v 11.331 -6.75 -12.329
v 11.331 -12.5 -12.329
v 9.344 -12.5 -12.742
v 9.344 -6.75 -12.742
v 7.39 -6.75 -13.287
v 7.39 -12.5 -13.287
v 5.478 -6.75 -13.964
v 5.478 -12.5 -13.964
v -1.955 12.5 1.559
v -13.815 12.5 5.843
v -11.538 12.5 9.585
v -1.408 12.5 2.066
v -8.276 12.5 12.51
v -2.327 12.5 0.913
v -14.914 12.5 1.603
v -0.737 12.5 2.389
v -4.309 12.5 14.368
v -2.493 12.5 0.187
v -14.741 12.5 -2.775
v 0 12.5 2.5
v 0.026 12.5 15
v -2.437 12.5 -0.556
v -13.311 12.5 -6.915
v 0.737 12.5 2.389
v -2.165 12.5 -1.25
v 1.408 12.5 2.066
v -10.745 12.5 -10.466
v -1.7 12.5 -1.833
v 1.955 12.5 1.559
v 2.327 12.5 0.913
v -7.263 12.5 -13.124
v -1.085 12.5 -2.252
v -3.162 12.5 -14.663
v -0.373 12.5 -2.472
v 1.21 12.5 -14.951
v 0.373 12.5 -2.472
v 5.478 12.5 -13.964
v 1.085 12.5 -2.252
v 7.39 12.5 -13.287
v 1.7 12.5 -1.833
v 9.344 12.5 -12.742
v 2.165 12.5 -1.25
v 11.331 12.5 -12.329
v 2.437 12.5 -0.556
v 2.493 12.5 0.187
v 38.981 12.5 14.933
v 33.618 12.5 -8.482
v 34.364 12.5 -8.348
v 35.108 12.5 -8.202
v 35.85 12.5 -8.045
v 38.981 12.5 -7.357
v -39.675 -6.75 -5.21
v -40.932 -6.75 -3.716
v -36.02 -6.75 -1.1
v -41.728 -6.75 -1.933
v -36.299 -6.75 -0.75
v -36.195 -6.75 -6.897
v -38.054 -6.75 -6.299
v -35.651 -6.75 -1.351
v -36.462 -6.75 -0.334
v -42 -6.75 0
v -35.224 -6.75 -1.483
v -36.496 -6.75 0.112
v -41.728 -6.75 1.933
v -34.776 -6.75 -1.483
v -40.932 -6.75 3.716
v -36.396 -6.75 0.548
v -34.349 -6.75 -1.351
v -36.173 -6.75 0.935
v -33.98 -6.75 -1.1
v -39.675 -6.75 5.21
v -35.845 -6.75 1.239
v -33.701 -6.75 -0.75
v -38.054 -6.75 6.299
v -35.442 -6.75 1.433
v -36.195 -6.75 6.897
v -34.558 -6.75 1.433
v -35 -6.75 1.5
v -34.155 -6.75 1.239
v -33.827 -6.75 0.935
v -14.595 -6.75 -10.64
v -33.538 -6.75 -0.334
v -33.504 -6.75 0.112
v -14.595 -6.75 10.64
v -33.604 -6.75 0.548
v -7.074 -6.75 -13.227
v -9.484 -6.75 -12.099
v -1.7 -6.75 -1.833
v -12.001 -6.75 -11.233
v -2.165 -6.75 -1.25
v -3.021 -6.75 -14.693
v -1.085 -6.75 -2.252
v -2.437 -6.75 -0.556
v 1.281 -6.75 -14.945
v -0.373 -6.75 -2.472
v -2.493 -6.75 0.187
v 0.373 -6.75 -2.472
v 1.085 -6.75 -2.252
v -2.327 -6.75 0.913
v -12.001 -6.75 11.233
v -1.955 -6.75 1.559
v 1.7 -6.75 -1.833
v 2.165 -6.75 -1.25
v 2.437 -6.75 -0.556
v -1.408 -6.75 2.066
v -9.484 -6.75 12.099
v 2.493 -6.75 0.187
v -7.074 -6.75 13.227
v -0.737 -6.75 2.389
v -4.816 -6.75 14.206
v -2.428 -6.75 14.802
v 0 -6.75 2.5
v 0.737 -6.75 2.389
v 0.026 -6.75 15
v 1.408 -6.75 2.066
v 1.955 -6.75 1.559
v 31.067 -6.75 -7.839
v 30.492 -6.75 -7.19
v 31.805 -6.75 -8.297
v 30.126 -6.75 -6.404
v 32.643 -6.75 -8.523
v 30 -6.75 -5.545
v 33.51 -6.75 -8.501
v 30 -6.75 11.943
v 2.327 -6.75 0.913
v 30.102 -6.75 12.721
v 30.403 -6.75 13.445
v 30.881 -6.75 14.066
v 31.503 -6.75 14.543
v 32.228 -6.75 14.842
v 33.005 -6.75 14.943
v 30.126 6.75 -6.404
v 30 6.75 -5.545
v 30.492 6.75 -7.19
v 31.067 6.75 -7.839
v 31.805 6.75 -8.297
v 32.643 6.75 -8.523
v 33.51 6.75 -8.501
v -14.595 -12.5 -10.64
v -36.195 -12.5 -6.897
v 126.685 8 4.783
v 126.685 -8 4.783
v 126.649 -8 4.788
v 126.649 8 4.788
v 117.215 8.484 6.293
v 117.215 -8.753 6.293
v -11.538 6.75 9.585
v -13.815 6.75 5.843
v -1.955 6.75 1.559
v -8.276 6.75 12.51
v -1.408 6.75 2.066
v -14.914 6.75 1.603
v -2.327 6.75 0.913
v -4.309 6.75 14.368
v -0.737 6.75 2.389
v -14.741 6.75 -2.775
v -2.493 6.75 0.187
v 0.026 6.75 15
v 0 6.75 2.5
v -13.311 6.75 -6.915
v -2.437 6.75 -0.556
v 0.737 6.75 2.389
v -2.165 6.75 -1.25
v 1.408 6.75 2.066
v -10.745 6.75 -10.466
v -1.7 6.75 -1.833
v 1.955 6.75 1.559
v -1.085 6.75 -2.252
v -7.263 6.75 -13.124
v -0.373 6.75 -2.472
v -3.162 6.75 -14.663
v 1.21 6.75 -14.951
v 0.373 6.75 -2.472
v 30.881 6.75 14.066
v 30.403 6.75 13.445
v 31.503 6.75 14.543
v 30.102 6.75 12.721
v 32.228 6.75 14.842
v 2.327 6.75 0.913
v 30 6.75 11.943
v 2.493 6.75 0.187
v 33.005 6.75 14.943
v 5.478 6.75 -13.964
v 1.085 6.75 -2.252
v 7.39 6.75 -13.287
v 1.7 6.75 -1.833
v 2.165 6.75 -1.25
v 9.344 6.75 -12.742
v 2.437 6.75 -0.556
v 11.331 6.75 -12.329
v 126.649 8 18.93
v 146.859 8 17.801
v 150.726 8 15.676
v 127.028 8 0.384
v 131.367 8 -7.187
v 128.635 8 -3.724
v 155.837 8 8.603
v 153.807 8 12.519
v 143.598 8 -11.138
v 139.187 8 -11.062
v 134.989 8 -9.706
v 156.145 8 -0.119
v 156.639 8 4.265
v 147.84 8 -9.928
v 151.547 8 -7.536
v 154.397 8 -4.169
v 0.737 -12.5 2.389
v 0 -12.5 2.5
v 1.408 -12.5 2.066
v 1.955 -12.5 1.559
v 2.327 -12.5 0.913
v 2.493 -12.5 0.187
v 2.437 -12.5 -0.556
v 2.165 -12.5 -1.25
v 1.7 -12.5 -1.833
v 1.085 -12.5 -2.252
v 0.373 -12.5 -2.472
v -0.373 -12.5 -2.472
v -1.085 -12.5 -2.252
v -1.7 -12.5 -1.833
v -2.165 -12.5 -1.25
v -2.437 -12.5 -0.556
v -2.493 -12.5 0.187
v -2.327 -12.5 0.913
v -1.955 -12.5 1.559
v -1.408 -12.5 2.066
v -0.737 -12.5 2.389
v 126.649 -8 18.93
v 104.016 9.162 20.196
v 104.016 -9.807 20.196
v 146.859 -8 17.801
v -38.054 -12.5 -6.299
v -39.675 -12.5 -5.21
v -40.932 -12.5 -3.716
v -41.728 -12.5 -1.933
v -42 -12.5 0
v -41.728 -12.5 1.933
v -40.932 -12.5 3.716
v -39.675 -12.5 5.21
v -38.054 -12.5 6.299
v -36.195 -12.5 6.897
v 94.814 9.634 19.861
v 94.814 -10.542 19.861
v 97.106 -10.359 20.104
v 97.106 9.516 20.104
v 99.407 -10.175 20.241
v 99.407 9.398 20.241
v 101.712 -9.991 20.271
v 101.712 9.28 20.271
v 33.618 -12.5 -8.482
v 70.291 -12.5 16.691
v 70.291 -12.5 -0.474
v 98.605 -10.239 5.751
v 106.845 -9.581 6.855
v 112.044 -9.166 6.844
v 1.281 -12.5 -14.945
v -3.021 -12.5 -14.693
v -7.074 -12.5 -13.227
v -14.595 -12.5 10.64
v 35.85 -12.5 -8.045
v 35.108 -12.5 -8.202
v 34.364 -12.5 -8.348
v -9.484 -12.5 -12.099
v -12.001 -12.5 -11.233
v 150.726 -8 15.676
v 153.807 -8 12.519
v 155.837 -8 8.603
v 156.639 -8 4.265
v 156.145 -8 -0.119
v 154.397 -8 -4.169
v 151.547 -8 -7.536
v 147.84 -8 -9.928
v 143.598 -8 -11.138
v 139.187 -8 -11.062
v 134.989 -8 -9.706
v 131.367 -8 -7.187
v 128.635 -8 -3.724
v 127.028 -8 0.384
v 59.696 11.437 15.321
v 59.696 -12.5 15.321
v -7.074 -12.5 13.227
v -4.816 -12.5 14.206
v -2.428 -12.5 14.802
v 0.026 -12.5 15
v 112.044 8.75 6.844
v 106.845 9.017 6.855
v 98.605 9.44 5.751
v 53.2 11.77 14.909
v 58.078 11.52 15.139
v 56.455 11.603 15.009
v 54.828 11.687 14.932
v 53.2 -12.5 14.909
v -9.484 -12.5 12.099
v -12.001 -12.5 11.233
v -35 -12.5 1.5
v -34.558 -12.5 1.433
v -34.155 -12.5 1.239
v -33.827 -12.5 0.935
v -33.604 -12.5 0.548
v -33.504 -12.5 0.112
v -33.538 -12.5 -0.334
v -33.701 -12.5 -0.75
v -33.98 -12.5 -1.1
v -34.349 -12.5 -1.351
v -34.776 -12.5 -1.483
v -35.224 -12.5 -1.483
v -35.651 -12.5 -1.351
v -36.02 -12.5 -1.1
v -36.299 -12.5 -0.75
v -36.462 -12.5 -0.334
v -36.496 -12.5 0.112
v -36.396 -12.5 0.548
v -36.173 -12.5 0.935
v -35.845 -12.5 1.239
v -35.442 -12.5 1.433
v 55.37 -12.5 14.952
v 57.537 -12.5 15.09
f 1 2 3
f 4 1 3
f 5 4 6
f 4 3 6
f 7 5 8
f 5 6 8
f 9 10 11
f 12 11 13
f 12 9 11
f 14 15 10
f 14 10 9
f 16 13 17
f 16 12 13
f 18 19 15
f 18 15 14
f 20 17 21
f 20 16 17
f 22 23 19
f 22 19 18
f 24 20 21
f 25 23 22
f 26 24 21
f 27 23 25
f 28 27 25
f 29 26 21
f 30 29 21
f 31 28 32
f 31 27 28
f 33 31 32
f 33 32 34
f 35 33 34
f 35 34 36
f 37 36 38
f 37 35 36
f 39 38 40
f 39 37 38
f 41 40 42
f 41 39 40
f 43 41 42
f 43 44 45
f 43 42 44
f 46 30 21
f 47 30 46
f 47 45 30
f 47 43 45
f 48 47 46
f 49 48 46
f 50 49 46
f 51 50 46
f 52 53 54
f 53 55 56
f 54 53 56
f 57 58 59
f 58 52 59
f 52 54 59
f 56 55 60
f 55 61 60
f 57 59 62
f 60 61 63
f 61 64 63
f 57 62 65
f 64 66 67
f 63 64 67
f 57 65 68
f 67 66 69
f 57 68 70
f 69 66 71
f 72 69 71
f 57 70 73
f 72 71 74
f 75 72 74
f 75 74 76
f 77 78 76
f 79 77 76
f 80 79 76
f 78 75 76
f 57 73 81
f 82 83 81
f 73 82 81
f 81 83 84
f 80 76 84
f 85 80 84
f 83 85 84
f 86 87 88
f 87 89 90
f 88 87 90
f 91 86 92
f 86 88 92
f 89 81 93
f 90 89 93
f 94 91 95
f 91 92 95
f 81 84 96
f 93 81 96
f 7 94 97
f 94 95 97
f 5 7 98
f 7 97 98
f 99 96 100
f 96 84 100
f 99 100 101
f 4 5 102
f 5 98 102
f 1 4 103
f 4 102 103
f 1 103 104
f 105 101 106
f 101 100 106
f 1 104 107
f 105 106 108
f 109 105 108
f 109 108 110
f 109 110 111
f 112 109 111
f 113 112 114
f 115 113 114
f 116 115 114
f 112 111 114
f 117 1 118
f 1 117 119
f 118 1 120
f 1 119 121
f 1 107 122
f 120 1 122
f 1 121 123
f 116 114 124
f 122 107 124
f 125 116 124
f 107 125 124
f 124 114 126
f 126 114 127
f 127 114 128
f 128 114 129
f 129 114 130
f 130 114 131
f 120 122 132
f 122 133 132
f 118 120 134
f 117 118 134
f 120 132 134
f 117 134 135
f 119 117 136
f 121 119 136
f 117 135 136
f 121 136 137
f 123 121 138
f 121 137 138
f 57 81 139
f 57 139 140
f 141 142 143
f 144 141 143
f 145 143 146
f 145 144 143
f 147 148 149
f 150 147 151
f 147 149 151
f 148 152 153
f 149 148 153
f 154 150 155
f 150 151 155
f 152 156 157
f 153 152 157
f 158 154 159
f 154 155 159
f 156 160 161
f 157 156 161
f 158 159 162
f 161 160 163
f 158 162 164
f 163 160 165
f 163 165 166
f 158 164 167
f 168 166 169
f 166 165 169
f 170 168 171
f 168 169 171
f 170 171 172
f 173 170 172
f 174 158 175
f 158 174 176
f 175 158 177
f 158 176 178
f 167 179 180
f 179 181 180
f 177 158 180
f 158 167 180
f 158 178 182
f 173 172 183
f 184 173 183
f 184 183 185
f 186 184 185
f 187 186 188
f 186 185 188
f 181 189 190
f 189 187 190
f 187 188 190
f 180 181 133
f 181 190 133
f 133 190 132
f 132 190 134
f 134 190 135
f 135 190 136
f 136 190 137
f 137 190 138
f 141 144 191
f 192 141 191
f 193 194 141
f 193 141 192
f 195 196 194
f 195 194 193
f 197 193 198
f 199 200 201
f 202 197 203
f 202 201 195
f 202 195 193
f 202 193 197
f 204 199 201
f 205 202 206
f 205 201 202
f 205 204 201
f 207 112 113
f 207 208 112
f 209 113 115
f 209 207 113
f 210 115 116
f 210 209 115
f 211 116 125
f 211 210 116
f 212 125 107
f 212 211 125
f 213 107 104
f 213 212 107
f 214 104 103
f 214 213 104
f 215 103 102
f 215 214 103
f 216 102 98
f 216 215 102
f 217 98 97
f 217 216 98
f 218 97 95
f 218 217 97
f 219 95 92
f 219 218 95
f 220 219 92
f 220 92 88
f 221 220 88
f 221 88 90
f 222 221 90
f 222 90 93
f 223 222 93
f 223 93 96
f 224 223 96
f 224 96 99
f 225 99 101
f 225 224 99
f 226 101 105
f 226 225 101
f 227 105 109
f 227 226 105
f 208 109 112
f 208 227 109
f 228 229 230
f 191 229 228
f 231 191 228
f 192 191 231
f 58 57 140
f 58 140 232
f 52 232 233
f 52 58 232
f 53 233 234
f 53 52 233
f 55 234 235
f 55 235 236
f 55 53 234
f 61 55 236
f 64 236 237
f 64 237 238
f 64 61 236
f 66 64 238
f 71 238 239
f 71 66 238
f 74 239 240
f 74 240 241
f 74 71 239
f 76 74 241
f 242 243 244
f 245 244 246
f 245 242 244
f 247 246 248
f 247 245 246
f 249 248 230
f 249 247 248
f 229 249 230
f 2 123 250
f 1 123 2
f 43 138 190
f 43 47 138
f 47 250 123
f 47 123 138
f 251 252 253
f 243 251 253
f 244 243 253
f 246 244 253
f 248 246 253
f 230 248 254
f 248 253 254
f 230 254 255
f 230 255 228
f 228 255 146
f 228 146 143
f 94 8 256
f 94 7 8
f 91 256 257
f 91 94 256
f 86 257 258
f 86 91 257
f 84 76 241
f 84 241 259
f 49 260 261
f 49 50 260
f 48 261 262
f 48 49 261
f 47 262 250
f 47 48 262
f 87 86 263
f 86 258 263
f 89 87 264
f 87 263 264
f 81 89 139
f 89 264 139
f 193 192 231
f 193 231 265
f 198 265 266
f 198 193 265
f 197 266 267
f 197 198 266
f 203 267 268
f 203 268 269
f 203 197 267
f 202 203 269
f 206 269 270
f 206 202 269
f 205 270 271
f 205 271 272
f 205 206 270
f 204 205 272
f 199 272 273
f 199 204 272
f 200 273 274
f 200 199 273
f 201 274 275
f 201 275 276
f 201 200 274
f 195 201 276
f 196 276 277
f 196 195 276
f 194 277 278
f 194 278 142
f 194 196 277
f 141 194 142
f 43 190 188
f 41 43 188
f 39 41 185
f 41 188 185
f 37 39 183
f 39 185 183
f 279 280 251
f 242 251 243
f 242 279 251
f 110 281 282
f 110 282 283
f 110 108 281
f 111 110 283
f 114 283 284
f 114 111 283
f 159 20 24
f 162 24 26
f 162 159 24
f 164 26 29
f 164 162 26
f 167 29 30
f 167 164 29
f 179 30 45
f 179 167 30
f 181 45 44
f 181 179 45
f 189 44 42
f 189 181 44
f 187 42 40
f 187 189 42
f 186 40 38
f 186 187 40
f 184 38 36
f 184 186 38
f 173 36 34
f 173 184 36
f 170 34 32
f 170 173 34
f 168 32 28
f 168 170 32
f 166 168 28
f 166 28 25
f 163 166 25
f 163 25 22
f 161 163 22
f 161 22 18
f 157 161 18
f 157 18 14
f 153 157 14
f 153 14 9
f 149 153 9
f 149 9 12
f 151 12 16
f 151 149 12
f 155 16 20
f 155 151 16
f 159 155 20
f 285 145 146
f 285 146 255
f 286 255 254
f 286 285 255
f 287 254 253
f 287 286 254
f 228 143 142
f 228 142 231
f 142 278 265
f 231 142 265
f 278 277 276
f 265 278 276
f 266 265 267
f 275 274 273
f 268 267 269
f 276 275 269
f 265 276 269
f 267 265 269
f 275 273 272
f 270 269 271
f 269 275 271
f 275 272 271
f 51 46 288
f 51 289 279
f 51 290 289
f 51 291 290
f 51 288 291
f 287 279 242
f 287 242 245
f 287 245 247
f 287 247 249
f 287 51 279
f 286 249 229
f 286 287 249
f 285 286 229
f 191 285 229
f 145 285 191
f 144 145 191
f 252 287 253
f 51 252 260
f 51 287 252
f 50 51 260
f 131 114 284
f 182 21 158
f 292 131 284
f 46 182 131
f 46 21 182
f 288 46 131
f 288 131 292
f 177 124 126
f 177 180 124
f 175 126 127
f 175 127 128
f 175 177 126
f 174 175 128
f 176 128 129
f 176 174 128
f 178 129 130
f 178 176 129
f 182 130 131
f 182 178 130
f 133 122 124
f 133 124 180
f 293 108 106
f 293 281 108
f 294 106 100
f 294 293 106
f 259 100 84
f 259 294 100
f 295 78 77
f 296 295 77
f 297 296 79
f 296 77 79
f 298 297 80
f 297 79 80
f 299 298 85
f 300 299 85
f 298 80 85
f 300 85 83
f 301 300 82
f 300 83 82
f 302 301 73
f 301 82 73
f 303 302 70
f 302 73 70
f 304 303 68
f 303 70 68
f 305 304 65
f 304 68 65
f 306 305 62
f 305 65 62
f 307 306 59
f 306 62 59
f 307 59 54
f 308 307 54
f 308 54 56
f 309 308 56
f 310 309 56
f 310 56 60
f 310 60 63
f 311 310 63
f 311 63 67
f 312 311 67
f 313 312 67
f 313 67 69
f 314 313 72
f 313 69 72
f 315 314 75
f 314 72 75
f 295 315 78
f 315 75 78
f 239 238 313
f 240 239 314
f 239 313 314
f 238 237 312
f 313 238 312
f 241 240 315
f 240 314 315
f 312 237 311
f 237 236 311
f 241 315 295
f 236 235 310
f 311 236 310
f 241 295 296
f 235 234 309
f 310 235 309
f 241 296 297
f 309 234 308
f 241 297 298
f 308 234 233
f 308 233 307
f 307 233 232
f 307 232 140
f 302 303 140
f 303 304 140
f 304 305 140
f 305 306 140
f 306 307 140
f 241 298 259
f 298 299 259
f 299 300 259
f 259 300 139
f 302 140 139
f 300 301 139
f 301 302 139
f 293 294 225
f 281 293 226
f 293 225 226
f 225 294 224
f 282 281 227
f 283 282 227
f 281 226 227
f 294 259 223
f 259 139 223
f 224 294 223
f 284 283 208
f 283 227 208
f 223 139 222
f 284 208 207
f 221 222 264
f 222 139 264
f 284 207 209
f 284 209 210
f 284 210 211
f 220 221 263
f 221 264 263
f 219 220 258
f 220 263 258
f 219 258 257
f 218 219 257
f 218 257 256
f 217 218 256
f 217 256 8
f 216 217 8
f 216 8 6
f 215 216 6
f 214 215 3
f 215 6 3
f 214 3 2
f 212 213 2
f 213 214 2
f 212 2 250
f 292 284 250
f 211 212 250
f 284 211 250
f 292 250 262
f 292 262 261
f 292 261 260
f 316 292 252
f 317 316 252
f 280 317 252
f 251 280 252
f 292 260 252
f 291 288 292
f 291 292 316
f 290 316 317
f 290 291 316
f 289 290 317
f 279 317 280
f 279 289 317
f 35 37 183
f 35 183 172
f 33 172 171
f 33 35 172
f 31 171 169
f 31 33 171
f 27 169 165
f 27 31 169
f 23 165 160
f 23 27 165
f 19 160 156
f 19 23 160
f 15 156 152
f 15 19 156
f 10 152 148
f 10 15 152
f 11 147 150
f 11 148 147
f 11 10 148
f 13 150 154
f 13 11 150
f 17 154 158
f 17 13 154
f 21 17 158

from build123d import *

# Parameters (mm, degrees)
SKETCH1_R                      = 2.5
BOSS_EXTRUDE1_DEPTH            = 12.5
CUT_EXTRUDE1_START             = -11.265362
CUT_EXTRUDE1_DEPTH             = 31.539115
FILLET1_R                      = 30
CUT_EXTRUDE2_REACH             = 160.449
SKETCH3_W                      = 45
SKETCH3_H                      = 13.5
CUT_EXTRUDE2_DIRECTION_2_REACH = 160.449
FILLET2_R                      = 3
BOSS_EXTRUDE2_START            = -19.25
SKETCH4_R                      = 1.5
BOSS_EXTRUDE2_DEPTH            = 5.75
FILLET3_R                      = 25


with BuildPart() as part:
    # Sketch1 → Boss-Extrude1 (new, symmetric)
    with BuildSketch(Plane(origin=(0, 0, 0), x_dir=(1, 0, 0), z_dir=(0, 1, 0))):
        with BuildLine():
            Line((0.025763833, -14.999977874), (53.199697381, -14.908646781))
            ThreePointArc((53.199697381, -14.908646781), (56.45455329, -15.0090982), (59.695967444, -15.321206773))
            Line((59.695967444, -15.321206773), (94.814307977, -19.861118805))
            ThreePointArc((94.814307977, -19.861118805), (99.407289265, -20.240711866), (104.015710949, -20.195794275))
            Line((104.015710949, -20.195794275), (146.859436035, -17.800512314))
            ThreePointArc((146.859436035, -17.800512314), (149.78171872, 8.869128334), (126.685409546, -4.782610416))
            Line((126.685409546, -4.782610416), (117.214630993, -6.293002063))
            ThreePointArc((117.214630993, -6.293002063), (107.884245813, -6.895762667), (98.604771495, -5.750876498))
            Line((98.604771495, -5.750876498), (35.849829613, 8.04486691))
            ThreePointArc((35.849829613, 8.04486691), (34.736624271, 8.276351777), (33.61844305, 8.482463724))
            Line((33.61844305, 8.482463724), (7.5, 12.990381057))
            ThreePointArc((7.5, 12.990381057), (-14.492216138, 3.869841264), (0.025763833, -14.999977874))
        make_face()
        with Locations(Location((0, 0, 0), (0, 0, 270))):
            Circle(SKETCH1_R, mode=Mode.SUBTRACT)
    extrude(amount=BOSS_EXTRUDE1_DEPTH, both=True)

    # Sketch2 → Cut-Extrude1 (cut)
    with BuildSketch(Plane.XY.offset(CUT_EXTRUDE1_START)):
        Polygon((38.980933682, -15), (126.64875656, -8), (156.64875656, -8), (156.64875656, -15), align=None)
        Polygon((156.64875656, 8), (156.64875656, 12.5), (38.980933682, 12.5), (126.64875656, 8), align=None)
    extrude(amount=CUT_EXTRUDE1_DEPTH, mode=Mode.SUBTRACT)

    # Fillet1
    fillet1_edges = [part.edges().sort_by_distance(p)[0] for p in [
        (7.5, 0, -12.990381057),
    ]]
    fillet(fillet1_edges, radius=FILLET1_R)

    # Sketch3 → Cut-Extrude2 (cut, up to next)
    with BuildSketch(Plane.XY, mode=Mode.PRIVATE) as cut_extrude2_sk1:
        with Locations((7.5, 0)):
            Rectangle(SKETCH3_W, SKETCH3_H)
    cut_extrude2_tool1 = extrude(cut_extrude2_sk1.sketch, amount=-CUT_EXTRUDE2_REACH, mode=Mode.PRIVATE) & part.part
    add(cut_extrude2_tool1.solids().sort_by_distance((7.5, 0, 0))[0], mode=Mode.SUBTRACT)

    # Sketch3 → Cut-Extrude2 direction 2 (cut, up to next)
    with BuildSketch(Plane.XY, mode=Mode.PRIVATE) as cut_extrude2_direction_2_sk1:
        with Locations((7.5, 0)):
            Rectangle(SKETCH3_W, SKETCH3_H)
    cut_extrude2_direction_2_tool1 = extrude(cut_extrude2_direction_2_sk1.sketch, amount=CUT_EXTRUDE2_DIRECTION_2_REACH, mode=Mode.PRIVATE) & part.part
    add(cut_extrude2_direction_2_tool1.solids().sort_by_distance((7.5, 0, 0))[0], mode=Mode.SUBTRACT)

    # Fillet2
    fillet2_edges = [part.edges().sort_by_distance(p)[0] for p in [
        (30, 0, 14.948494383),
        (30, 0, -9.106989547),
    ]]
    fillet(fillet2_edges, radius=FILLET2_R)

    # Sketch4 → Boss-Extrude2 (add)
    with BuildSketch(Plane(origin=(0, 12.5, 0), x_dir=(1, 0, 0), z_dir=(0, 1, 0)).offset(BOSS_EXTRUDE2_START)):
        with BuildLine():
            Line((-9.630680142, 11.5), (-36.195071959, 6.897231547))
            ThreePointArc((-36.195071959, 6.897231547), (-42, 0), (-36.195071959, -6.897231547))
            Line((-36.195071959, -6.897231547), (-9.630680142, -11.5))
            ThreePointArc((-9.630680142, -11.5), (-15, 0), (-9.630680142, 11.5))
        make_face()
        with Locations(Location((-35, 0, 0), (0, 0, 270))):
            Circle(SKETCH4_R, mode=Mode.SUBTRACT)
    extrude(amount=-BOSS_EXTRUDE2_DEPTH)

    # Fillet3
    fillet3_edges = [part.edges().sort_by_distance(p)[0] for p in [
        (-9.630680142, -9.625, -11.5),
        (-9.630680142, -9.625, 11.5),
    ]]
    fillet(fillet3_edges, radius=FILLET3_R)


solid = part.part
